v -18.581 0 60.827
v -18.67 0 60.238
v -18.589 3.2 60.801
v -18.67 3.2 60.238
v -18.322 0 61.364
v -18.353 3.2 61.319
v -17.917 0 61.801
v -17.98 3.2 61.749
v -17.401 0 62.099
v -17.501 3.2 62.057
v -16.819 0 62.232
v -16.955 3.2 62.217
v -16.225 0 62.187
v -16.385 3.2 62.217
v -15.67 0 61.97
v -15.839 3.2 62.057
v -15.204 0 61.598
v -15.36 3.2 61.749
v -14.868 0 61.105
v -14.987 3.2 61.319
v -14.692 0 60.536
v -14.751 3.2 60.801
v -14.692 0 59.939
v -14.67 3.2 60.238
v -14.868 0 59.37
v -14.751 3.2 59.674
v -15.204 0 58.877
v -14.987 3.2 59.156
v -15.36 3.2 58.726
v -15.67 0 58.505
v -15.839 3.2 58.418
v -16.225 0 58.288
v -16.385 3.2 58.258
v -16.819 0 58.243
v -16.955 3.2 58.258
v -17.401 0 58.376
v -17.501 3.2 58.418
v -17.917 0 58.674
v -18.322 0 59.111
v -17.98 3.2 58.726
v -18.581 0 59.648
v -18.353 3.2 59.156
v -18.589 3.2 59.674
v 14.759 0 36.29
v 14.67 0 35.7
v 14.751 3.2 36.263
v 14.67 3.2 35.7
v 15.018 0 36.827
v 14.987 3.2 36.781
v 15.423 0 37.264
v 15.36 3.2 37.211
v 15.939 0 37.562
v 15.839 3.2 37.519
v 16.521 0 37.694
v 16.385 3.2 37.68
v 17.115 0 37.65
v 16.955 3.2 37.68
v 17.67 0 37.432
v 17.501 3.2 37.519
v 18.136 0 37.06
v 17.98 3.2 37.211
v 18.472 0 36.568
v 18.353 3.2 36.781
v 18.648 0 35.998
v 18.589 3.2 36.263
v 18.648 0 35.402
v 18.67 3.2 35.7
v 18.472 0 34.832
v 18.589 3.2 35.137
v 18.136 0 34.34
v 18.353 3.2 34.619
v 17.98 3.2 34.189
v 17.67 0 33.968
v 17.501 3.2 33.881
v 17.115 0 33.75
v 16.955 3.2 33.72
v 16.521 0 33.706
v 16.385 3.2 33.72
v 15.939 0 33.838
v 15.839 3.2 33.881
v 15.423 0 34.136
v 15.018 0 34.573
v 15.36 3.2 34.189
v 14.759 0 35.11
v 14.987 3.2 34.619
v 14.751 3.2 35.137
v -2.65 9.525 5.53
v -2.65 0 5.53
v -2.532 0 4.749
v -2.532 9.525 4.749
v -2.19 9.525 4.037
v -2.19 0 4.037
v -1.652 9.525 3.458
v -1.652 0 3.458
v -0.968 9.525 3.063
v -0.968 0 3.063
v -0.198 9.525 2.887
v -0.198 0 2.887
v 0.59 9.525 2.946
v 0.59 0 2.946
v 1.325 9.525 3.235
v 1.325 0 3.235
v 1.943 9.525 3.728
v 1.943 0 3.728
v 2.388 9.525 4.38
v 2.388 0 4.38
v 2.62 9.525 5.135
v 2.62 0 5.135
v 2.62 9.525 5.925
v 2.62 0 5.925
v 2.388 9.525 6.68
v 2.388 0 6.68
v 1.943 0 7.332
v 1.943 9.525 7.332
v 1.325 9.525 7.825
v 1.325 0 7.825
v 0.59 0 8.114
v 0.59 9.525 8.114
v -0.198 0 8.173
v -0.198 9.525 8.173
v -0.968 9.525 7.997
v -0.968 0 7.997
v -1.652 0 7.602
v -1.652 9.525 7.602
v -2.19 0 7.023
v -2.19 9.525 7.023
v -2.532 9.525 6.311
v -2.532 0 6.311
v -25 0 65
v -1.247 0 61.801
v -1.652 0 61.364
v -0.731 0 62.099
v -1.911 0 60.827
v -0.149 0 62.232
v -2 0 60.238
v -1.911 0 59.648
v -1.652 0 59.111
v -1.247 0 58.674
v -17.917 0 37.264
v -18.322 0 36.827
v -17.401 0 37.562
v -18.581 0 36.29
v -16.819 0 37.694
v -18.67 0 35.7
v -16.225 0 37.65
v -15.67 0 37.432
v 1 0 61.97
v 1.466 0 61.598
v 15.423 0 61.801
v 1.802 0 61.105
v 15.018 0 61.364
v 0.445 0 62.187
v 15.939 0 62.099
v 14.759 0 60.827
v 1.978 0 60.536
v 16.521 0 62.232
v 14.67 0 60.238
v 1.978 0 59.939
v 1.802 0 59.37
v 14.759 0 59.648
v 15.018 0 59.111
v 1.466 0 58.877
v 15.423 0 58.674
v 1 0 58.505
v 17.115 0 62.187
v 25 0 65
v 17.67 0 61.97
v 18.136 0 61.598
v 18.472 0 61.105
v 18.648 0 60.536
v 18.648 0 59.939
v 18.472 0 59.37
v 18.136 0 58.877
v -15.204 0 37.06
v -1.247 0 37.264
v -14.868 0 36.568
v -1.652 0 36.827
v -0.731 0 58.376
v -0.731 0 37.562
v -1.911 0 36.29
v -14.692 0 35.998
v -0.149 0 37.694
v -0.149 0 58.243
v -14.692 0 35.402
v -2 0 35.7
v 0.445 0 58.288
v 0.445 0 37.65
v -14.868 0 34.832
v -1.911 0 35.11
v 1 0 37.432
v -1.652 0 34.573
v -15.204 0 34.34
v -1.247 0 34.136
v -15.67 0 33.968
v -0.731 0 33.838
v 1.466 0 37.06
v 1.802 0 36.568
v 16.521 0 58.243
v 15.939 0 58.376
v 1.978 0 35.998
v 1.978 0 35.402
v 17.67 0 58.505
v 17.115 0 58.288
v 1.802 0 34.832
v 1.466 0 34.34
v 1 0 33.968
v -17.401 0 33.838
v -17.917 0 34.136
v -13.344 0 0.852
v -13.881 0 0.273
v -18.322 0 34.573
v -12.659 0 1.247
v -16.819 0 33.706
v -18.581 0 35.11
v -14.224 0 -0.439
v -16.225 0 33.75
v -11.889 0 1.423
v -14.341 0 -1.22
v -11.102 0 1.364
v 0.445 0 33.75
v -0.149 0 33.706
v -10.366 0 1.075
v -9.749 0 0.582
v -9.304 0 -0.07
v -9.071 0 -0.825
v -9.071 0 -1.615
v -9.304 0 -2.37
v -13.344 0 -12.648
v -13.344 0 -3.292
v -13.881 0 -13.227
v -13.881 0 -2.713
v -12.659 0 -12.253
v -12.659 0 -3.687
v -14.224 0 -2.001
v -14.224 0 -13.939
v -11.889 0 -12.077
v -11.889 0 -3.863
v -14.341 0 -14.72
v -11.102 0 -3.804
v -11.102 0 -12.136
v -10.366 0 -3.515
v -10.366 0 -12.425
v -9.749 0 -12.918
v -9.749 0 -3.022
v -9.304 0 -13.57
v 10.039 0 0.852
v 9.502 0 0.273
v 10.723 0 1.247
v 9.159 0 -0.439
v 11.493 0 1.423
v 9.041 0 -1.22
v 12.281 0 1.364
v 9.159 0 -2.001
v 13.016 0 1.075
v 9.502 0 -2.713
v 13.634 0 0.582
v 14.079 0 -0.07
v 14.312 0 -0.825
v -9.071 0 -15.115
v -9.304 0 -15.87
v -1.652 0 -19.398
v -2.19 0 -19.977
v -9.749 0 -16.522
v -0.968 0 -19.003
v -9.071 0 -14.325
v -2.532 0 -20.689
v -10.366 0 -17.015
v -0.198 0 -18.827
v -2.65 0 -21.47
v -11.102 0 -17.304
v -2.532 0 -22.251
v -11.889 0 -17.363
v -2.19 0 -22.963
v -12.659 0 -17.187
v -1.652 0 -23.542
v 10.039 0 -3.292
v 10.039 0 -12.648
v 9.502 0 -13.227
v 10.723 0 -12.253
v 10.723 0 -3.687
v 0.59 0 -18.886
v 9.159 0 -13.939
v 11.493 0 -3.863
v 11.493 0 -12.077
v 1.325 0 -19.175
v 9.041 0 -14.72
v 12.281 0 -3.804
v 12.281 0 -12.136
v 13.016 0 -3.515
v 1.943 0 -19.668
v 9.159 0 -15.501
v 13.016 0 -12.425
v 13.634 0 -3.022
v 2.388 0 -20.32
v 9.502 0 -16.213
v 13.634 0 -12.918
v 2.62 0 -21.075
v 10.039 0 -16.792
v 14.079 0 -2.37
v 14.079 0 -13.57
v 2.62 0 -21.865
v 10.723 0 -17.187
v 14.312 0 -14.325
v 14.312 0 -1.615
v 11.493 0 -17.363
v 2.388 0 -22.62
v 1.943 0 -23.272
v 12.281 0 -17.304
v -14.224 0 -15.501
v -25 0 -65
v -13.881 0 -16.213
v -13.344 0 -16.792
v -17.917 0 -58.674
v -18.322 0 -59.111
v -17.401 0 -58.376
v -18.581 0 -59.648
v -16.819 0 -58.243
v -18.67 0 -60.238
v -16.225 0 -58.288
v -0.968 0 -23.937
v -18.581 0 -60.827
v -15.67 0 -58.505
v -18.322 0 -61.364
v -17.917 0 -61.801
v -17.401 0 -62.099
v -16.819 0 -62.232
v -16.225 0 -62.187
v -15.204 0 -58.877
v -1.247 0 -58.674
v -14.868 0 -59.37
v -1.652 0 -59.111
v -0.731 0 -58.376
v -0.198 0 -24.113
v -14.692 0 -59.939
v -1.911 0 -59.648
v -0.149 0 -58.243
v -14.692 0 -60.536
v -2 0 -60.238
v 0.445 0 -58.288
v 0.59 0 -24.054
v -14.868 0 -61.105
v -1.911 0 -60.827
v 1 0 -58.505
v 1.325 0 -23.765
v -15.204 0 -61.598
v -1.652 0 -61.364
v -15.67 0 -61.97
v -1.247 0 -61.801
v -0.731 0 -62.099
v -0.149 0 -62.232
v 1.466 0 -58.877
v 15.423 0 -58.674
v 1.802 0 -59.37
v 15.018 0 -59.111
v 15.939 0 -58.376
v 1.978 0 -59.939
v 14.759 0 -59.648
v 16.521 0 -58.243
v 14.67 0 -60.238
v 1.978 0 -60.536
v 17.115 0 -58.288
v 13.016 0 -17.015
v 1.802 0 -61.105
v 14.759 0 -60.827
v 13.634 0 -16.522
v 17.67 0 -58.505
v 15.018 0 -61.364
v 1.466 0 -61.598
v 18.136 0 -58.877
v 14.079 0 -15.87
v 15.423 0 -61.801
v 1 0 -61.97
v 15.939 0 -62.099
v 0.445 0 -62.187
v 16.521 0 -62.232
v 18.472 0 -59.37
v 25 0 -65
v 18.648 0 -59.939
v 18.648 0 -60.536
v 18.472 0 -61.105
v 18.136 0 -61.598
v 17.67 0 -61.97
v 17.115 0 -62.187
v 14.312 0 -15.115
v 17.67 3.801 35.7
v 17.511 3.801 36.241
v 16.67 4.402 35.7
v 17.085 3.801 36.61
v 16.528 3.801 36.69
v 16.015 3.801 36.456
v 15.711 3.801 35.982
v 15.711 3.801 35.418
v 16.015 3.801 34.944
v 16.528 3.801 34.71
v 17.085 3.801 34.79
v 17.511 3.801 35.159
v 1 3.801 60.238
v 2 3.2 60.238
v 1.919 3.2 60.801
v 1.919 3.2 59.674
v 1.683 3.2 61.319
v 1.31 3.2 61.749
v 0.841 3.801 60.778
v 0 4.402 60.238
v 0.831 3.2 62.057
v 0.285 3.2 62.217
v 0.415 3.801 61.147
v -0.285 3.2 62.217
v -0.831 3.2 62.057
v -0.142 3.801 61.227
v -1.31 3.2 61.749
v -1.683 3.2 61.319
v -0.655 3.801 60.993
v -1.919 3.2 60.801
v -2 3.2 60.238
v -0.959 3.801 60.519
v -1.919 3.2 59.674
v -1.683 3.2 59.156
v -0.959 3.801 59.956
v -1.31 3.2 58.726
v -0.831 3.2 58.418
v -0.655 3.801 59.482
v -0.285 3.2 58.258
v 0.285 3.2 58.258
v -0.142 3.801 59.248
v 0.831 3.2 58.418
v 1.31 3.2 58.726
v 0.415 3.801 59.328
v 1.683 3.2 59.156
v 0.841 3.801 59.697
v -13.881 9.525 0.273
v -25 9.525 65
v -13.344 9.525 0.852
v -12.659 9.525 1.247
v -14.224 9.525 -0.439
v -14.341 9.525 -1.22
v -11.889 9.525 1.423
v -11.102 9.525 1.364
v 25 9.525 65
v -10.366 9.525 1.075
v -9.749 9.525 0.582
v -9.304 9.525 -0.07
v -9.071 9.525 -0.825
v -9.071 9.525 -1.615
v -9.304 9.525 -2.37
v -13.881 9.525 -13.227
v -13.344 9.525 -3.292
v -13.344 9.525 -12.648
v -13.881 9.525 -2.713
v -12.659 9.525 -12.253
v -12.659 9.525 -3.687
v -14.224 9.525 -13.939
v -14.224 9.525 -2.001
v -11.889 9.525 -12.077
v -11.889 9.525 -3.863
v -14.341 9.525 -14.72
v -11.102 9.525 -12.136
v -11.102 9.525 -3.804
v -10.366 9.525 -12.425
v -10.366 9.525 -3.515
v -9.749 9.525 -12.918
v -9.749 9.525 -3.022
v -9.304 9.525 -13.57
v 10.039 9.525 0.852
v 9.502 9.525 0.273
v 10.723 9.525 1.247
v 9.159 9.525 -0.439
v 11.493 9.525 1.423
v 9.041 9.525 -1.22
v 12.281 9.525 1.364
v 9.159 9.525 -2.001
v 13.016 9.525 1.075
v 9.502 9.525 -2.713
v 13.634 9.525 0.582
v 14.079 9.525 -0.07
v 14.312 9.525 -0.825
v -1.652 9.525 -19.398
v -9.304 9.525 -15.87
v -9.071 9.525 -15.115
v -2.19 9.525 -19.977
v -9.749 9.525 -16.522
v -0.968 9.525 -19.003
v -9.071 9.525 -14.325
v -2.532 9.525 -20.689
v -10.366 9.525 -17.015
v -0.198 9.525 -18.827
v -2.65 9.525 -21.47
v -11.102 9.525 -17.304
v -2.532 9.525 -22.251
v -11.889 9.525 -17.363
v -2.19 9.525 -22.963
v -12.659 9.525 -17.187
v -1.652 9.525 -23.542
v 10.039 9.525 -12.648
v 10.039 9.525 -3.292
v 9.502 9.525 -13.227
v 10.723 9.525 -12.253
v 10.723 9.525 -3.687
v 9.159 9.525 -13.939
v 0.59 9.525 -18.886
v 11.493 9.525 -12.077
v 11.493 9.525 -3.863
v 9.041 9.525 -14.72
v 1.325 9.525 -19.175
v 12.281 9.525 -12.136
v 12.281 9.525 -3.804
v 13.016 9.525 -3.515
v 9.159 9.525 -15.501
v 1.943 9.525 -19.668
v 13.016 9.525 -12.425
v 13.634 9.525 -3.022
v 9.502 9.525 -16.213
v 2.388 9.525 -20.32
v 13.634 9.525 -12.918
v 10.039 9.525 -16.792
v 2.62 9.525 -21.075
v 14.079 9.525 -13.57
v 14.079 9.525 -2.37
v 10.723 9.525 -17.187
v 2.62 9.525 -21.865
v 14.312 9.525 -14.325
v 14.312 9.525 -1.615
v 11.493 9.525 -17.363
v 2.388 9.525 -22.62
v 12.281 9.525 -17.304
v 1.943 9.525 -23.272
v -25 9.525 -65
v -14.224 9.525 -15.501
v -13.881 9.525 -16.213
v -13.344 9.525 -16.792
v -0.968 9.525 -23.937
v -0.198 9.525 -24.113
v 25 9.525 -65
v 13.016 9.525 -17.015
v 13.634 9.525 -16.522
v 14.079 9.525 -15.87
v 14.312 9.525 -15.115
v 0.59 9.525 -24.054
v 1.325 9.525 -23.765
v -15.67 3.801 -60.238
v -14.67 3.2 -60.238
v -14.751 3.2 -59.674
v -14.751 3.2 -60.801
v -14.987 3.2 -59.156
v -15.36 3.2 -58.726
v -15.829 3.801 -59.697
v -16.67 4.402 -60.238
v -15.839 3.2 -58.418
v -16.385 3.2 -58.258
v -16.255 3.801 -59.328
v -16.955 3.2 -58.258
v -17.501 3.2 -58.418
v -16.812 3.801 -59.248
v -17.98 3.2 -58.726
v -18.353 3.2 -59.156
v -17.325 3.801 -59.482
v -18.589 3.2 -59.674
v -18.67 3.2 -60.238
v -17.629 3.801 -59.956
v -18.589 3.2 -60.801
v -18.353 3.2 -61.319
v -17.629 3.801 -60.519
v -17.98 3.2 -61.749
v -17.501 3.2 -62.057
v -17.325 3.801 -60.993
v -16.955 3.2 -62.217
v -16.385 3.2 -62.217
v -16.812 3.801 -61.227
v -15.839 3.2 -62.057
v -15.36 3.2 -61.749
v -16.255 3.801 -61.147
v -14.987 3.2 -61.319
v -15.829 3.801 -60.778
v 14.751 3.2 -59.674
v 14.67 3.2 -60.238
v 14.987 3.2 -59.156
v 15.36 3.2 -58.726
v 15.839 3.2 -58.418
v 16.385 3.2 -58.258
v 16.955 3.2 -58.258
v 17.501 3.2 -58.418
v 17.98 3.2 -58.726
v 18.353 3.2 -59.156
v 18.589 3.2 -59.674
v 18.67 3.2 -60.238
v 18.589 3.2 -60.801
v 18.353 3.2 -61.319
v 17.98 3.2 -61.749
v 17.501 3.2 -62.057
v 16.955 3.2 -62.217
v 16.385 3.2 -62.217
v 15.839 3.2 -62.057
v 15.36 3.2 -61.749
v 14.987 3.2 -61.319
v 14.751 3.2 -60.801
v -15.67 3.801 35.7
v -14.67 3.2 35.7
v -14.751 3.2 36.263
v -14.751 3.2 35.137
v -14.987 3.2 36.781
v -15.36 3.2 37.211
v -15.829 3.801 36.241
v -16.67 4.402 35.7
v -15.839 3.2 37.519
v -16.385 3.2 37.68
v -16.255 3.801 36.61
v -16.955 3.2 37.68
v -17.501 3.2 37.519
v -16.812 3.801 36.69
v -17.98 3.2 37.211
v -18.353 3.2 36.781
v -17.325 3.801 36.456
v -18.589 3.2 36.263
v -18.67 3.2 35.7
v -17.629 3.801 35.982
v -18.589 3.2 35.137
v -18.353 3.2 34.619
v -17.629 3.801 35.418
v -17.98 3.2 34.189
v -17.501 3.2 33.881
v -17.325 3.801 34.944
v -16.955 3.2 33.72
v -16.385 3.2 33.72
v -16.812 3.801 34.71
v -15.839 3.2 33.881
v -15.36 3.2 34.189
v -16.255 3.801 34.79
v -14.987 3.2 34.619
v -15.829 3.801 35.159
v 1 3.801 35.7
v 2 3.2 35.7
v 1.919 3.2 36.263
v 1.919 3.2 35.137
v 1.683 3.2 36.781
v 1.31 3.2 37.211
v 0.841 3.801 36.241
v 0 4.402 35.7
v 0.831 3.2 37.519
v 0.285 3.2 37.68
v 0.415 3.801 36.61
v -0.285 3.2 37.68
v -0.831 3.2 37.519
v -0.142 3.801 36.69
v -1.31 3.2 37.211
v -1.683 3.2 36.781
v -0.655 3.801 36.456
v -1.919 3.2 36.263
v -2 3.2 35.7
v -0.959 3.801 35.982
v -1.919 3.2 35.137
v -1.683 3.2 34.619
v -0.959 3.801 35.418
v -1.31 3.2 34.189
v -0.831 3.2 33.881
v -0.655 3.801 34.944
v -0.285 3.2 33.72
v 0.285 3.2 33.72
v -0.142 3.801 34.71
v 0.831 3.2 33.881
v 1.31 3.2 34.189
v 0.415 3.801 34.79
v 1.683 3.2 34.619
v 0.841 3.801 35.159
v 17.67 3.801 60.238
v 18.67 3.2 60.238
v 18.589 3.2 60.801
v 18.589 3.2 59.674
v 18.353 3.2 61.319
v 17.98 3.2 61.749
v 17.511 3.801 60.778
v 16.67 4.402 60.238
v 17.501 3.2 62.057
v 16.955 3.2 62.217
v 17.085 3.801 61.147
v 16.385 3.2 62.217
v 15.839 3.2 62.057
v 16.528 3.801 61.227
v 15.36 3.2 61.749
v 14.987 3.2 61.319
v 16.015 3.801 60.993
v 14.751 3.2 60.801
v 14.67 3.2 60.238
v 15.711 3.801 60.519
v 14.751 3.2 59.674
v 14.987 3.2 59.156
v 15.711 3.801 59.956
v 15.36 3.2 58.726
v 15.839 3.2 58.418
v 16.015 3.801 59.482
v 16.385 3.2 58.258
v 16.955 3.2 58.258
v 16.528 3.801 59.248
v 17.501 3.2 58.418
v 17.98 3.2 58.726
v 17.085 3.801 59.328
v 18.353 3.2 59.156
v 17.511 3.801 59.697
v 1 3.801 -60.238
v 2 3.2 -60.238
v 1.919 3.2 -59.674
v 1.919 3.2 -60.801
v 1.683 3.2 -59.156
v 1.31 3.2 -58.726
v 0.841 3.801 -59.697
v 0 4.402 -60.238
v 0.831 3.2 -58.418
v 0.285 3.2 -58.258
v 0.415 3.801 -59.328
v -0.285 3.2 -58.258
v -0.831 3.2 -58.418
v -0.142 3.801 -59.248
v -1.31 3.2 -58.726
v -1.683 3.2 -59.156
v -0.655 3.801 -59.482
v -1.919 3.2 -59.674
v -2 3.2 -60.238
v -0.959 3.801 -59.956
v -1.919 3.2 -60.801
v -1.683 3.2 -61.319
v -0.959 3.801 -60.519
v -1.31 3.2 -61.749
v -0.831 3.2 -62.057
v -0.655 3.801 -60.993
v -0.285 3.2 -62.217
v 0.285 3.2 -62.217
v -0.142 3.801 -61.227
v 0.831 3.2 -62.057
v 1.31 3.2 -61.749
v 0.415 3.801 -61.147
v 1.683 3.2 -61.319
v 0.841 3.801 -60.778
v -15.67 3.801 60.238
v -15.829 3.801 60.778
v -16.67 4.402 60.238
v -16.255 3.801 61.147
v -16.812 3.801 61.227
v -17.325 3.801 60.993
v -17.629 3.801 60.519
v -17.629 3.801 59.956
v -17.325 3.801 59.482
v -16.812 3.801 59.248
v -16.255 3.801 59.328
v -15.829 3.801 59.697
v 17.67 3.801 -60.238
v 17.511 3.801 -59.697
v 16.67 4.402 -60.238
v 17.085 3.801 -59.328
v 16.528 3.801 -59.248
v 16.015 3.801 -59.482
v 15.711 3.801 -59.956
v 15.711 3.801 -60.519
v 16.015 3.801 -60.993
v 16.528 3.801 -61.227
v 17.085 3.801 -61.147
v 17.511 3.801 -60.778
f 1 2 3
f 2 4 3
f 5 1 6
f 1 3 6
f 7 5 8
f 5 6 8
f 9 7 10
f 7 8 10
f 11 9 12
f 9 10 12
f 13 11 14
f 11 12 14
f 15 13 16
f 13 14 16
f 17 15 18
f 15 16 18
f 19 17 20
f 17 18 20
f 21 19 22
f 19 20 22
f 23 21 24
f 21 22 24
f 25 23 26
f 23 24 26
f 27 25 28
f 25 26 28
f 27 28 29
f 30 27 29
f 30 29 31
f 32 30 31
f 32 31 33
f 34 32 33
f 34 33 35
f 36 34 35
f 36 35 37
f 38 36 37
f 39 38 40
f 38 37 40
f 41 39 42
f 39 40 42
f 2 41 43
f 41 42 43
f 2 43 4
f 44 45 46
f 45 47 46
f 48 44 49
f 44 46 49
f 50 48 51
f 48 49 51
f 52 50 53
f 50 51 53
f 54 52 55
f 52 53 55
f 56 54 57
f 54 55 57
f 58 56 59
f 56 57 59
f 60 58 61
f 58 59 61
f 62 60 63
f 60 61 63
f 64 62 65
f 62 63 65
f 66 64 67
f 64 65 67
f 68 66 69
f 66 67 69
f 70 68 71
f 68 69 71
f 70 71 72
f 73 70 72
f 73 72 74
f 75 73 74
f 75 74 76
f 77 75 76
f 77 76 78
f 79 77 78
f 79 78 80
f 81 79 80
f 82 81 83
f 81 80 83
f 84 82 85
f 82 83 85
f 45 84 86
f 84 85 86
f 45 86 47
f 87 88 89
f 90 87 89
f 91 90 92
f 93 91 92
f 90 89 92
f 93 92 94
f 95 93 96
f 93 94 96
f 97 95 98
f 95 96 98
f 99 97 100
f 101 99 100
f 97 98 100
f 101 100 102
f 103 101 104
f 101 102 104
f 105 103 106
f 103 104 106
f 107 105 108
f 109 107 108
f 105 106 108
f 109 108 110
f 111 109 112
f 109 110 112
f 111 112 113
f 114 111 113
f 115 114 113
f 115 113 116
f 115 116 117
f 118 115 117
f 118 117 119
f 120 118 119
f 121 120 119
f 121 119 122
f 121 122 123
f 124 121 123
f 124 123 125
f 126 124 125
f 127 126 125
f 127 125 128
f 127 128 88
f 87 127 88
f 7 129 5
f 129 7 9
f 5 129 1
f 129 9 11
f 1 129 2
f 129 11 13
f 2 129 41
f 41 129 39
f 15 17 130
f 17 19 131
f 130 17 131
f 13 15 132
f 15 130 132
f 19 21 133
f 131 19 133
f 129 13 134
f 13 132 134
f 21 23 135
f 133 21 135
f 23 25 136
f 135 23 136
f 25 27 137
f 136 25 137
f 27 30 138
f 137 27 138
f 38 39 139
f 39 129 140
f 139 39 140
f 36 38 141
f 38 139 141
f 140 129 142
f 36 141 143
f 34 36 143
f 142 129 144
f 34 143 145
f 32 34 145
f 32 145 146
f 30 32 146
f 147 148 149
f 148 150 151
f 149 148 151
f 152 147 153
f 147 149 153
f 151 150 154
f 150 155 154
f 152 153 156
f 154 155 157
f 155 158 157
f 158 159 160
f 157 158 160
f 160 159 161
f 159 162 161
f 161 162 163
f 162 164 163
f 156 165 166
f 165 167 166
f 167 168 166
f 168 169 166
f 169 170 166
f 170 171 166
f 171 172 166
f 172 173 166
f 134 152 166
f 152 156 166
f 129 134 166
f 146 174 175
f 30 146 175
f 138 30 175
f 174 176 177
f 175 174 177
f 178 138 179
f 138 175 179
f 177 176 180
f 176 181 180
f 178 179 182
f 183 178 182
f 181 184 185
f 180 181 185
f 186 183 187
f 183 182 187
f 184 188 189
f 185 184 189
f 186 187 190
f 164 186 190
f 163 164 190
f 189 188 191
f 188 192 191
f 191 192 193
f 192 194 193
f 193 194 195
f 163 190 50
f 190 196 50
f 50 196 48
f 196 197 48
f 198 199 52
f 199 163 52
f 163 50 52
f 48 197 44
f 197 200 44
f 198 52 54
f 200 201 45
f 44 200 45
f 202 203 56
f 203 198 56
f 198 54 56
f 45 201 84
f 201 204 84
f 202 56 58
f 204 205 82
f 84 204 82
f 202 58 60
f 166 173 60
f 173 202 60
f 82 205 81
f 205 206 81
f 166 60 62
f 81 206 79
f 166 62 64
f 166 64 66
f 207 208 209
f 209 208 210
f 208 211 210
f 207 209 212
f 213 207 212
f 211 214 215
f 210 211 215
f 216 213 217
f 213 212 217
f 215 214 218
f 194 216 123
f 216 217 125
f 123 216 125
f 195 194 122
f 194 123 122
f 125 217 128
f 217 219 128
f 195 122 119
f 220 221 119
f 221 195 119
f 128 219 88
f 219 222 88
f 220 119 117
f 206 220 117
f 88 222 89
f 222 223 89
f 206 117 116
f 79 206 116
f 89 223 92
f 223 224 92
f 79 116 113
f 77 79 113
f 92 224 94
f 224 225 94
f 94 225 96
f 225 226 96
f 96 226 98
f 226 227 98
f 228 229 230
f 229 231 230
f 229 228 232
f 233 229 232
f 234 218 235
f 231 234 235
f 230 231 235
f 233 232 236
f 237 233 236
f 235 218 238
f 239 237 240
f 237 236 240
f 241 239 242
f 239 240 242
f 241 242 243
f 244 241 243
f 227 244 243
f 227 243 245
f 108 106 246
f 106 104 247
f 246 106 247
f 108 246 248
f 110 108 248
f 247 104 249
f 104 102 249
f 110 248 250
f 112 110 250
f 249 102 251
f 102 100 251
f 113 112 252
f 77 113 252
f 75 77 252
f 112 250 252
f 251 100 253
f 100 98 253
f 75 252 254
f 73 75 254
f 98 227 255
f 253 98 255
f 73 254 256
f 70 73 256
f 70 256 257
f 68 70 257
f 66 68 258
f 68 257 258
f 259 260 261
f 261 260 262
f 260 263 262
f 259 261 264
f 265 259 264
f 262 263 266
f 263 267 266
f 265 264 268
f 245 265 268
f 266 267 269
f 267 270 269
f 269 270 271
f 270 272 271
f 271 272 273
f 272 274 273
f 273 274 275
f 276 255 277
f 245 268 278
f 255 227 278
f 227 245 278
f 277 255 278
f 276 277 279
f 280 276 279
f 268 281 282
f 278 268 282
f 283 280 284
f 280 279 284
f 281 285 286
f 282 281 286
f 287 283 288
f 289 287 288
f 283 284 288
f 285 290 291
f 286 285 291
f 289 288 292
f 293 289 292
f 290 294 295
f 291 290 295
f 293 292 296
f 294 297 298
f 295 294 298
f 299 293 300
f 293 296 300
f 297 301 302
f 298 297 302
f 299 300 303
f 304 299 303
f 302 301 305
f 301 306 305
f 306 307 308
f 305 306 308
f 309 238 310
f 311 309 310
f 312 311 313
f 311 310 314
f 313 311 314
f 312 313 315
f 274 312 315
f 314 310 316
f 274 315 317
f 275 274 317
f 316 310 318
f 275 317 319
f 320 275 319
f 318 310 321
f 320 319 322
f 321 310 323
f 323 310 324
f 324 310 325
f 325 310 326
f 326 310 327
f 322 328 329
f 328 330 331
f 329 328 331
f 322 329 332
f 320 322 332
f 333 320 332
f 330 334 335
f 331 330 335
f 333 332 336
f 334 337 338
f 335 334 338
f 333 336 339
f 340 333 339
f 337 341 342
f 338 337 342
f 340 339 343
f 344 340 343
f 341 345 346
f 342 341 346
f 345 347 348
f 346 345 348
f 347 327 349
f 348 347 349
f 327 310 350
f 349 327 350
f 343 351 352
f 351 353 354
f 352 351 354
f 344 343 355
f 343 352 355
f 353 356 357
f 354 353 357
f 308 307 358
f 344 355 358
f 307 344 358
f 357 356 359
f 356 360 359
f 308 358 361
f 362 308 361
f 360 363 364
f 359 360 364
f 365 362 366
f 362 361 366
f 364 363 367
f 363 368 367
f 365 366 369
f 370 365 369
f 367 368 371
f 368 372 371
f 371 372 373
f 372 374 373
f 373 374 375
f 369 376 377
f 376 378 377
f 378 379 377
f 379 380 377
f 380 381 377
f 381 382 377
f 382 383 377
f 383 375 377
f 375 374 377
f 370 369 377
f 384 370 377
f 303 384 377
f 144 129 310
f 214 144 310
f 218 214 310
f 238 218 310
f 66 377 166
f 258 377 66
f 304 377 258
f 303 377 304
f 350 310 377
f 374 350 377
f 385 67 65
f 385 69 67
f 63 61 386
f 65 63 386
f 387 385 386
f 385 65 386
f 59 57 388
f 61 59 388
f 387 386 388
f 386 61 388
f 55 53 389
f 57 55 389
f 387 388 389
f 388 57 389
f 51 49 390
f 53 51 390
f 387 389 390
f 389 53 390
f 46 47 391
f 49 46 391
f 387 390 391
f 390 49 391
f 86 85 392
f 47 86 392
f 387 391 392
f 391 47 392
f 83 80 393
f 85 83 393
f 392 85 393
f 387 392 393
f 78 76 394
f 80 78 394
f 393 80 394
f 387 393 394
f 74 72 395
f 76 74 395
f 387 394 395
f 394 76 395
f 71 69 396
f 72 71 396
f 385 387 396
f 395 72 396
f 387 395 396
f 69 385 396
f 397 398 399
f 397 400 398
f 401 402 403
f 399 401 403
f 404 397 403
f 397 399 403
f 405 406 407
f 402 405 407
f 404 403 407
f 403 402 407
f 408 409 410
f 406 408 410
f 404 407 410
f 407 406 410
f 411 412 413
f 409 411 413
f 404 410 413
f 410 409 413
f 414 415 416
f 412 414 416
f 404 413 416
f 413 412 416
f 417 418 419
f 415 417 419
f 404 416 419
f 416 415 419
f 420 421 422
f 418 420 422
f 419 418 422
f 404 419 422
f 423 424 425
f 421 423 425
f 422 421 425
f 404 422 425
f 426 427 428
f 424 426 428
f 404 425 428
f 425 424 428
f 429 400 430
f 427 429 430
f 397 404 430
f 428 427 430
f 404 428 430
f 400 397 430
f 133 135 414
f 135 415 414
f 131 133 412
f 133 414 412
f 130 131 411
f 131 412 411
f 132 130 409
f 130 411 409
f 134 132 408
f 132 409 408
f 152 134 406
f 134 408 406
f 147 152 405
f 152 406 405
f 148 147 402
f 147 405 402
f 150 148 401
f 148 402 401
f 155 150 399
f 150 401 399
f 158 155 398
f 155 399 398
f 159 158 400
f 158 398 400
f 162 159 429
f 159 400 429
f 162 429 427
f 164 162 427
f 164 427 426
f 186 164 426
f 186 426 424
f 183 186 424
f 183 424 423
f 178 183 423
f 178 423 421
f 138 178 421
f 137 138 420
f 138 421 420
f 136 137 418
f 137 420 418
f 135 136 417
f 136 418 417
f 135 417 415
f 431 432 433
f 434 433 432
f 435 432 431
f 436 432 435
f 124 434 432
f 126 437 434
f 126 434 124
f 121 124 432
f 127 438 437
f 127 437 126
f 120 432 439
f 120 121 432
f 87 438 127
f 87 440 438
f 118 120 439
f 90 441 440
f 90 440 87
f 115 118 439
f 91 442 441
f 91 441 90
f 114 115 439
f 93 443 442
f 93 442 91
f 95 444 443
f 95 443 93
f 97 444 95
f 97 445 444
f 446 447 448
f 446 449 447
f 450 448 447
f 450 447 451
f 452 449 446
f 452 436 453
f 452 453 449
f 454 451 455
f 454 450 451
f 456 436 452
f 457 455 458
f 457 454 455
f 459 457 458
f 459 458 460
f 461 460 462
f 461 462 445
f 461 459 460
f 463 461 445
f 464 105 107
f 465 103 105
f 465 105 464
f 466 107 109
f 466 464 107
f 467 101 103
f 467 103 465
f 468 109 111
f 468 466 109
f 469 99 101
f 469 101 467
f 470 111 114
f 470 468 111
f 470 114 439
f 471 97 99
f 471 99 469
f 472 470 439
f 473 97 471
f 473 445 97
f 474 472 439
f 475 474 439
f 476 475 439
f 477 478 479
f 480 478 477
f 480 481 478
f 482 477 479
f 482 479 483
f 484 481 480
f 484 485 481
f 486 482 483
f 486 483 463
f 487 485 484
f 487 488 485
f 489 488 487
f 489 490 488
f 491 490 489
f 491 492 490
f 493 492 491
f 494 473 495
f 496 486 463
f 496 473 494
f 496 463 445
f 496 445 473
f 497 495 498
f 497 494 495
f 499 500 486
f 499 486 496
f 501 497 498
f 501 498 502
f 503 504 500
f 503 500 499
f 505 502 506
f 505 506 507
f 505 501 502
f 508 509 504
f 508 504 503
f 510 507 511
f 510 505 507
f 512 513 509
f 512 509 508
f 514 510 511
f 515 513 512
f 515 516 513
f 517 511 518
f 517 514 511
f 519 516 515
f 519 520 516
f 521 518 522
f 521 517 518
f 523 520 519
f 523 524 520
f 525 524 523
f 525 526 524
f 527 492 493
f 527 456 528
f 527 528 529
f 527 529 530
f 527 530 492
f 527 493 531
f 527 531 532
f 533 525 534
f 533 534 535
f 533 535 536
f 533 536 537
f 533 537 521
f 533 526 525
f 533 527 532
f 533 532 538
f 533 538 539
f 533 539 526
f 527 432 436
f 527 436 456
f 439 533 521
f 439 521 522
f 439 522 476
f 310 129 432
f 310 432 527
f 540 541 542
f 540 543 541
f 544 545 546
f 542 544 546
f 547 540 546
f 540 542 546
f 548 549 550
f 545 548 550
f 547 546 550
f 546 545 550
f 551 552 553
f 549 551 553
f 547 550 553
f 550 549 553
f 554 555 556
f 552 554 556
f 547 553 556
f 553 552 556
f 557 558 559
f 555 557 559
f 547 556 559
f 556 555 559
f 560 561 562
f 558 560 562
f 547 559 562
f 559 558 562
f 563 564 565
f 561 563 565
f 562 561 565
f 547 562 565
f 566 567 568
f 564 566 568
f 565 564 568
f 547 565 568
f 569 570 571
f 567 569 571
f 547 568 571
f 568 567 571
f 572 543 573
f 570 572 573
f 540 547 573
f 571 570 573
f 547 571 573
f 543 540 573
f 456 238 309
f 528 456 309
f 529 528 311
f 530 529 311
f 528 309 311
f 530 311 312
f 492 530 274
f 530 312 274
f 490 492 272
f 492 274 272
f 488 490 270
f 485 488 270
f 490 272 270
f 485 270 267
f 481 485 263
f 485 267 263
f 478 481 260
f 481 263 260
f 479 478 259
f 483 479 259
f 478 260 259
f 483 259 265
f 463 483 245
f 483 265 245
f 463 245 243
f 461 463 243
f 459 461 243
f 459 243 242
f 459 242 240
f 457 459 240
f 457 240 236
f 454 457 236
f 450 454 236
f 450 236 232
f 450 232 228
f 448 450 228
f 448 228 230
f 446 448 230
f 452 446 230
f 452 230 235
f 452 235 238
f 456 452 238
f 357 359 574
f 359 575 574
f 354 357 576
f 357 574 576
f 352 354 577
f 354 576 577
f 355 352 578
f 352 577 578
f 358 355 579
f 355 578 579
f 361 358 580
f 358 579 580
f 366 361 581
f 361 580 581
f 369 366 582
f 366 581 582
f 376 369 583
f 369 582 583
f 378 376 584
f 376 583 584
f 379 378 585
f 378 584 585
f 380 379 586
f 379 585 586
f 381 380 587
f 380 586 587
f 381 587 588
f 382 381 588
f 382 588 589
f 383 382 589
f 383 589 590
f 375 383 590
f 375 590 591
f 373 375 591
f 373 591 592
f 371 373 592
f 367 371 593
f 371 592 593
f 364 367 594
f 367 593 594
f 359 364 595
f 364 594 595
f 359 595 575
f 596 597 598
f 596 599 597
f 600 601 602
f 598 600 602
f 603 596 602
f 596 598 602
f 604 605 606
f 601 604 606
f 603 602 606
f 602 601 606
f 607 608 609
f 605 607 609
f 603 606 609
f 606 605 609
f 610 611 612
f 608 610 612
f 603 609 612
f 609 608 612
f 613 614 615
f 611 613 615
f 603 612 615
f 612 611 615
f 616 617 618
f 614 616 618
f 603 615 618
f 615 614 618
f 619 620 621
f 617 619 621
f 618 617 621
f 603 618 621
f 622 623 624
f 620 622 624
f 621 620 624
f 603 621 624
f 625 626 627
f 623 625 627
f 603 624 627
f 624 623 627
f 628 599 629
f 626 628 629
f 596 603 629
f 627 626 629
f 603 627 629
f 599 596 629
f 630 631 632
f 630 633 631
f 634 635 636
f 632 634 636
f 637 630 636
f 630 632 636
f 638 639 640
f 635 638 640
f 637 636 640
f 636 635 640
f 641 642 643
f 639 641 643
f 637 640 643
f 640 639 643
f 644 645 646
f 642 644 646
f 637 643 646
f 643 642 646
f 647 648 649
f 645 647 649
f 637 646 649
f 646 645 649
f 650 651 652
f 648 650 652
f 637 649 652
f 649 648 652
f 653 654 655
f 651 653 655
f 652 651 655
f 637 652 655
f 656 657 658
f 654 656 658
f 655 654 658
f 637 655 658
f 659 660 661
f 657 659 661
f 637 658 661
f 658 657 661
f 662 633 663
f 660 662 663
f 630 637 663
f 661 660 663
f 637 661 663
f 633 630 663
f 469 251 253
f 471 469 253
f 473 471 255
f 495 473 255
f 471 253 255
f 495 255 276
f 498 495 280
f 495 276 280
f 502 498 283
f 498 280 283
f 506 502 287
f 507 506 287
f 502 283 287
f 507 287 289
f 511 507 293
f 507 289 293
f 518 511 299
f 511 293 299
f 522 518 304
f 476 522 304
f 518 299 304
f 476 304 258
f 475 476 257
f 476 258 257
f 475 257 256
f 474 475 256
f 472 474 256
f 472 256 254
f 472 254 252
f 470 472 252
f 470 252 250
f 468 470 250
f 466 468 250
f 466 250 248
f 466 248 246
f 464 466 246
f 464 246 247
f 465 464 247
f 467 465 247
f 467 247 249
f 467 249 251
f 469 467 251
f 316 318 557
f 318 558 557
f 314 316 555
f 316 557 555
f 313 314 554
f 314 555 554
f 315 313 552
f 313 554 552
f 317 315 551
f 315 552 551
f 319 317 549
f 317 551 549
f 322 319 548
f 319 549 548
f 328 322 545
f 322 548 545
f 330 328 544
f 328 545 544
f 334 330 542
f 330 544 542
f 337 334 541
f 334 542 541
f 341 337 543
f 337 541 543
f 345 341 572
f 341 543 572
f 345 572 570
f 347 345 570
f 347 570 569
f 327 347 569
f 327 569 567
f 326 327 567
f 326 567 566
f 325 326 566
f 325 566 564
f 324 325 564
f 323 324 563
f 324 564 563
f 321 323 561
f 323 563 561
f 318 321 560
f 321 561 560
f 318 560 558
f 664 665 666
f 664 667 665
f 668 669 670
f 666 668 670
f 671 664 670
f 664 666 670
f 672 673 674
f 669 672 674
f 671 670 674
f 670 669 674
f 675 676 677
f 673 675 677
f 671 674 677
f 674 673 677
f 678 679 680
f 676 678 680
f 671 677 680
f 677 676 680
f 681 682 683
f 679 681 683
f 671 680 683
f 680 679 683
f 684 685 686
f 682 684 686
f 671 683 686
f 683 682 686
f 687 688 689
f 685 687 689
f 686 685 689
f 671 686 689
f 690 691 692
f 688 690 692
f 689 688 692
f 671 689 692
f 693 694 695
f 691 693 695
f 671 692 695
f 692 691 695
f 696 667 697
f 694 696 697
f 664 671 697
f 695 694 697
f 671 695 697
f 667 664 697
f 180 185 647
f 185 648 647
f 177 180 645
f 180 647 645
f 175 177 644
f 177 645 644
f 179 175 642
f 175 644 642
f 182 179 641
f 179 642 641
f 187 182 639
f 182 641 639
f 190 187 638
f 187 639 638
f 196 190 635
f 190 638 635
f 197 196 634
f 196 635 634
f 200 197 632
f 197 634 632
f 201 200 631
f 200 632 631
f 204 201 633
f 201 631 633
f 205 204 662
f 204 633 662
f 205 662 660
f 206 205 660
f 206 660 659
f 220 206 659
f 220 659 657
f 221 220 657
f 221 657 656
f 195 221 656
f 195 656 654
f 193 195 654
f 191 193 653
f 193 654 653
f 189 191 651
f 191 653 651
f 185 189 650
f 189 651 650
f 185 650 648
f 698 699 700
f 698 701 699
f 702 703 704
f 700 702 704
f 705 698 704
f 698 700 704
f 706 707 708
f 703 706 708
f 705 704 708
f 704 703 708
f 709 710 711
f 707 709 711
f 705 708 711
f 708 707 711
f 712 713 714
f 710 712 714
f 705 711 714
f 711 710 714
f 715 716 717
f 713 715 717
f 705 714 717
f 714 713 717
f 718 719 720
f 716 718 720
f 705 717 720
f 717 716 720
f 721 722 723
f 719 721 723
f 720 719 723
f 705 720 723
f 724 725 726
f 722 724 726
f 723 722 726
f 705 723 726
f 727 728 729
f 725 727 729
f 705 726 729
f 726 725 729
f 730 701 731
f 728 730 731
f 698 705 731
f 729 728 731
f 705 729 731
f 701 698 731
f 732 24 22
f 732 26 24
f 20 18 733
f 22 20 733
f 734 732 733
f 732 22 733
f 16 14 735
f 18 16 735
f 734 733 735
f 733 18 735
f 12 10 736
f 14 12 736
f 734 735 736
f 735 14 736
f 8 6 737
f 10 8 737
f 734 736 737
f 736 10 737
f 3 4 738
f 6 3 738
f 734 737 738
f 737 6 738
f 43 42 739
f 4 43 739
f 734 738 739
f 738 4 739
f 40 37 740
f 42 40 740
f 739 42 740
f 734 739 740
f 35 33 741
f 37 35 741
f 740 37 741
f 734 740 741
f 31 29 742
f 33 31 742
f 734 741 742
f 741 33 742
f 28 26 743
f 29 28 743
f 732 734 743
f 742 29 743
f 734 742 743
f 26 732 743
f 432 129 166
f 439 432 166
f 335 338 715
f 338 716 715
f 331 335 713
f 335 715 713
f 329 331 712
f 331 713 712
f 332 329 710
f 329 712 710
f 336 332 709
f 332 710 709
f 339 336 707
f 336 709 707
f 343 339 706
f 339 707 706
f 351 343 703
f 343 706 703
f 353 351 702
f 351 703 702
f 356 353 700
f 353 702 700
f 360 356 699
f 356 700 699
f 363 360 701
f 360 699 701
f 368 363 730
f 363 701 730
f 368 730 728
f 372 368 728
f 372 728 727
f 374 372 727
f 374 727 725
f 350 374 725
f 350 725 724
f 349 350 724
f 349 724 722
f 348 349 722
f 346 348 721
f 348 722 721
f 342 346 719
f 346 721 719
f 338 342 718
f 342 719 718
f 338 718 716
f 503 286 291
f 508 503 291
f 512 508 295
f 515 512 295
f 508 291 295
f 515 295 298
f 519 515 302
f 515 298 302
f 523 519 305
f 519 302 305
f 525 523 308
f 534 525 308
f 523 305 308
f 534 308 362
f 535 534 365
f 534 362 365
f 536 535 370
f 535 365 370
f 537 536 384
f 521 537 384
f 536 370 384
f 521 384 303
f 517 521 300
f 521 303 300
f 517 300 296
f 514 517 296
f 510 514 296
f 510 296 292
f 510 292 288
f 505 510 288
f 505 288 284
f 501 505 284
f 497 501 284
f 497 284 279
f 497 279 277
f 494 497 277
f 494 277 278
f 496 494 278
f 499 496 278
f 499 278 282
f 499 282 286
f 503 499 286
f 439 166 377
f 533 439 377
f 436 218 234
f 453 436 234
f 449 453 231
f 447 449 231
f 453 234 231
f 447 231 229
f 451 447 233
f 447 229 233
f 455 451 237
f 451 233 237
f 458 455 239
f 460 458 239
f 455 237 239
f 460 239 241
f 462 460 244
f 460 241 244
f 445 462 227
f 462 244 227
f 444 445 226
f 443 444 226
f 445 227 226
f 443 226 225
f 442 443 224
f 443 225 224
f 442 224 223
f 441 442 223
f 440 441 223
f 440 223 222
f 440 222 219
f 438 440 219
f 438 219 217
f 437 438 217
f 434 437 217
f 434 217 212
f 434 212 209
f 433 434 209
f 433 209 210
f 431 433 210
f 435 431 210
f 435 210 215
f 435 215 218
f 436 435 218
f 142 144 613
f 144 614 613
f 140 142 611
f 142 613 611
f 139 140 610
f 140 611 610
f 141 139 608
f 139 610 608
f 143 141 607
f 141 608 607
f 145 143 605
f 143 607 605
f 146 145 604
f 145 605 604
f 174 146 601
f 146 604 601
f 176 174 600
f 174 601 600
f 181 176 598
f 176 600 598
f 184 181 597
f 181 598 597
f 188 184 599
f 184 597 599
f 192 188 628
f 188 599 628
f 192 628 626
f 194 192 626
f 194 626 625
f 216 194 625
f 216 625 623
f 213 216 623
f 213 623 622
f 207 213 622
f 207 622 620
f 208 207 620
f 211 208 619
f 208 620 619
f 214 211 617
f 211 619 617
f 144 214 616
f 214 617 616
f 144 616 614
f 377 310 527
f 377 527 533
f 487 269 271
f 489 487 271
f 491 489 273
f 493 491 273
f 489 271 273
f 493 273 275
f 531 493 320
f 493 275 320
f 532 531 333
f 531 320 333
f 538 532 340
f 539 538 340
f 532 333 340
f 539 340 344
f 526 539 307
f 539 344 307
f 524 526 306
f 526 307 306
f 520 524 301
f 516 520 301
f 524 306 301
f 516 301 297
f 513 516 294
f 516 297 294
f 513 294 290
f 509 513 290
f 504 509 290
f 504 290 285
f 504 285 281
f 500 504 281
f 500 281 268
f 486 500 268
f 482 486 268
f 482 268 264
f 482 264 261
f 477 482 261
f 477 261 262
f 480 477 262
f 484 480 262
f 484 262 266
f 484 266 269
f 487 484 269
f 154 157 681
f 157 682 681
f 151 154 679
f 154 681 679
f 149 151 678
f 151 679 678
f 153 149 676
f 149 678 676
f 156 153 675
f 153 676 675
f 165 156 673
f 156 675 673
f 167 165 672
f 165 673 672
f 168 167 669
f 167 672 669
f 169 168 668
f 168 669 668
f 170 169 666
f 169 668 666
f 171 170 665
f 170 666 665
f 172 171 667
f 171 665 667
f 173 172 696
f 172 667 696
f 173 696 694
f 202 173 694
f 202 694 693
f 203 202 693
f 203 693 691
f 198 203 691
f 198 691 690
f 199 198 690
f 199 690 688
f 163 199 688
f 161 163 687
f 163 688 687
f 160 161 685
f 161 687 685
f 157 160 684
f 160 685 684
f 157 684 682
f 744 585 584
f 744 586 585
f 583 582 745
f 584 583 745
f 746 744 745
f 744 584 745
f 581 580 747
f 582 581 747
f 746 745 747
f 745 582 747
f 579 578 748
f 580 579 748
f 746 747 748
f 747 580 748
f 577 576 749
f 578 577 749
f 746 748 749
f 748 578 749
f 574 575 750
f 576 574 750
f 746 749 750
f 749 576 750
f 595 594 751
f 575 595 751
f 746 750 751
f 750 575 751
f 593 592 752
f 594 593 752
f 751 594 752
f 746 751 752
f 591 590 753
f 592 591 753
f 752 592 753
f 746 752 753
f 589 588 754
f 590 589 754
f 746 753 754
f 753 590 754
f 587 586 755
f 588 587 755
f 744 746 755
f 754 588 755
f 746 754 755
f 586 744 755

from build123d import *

# Parameters (mm, degrees)
SKETCH1_W                 = 50
SKETCH1_H                 = 130
BOSS_EXTRUDE1_DEPTH       = 9.525
F_4_0MM_DOWEL_HOLE1_D     = 4
F_4_0MM_DOWEL_HOLE1_DEPTH = 3.2
F_4_0MM_DOWEL_HOLE1_TIP   = 1.201721238
M5_CLEARANCE_HOLE1_D      = 5.3


with BuildPart() as part:
    # Sketch1 → Boss-Extrude1 (new body)
    with BuildSketch(Plane(origin=(0, 0, 0), x_dir=(1, 0, 0), z_dir=(0, 1, 0))):
        Rectangle(SKETCH1_W, SKETCH1_H)
    extrude(amount=BOSS_EXTRUDE1_DEPTH)

    # Ø4.0mm Dowel Hole1
    with Locations(Plane.XZ):
        with Locations((-16.67, 60.2375), (-16.67, -60.2375), (0, -60.2375), (16.67, -60.2375), (16.67, 35.7), (0, 35.7), (-16.67, 35.7), (16.67, 60.2375), (0, 60.2375)):
            Hole(F_4_0MM_DOWEL_HOLE1_D / 2, depth=F_4_0MM_DOWEL_HOLE1_DEPTH)
            with Locations((0, 0, -(F_4_0MM_DOWEL_HOLE1_DEPTH + F_4_0MM_DOWEL_HOLE1_TIP / 2))):  # 118° drill point
                Cone(0, F_4_0MM_DOWEL_HOLE1_D / 2, F_4_0MM_DOWEL_HOLE1_TIP, mode=Mode.SUBTRACT)

    # M5 Clearance Hole1 (through all)
    with Locations(Plane(origin=(0, 9.525, 0), x_dir=(1, 0, 0), z_dir=(0, 1, 0))):
        with Locations((-11.691342951, 14.72), (0, 21.47), (11.691342951, 14.72), (11.691342951, 1.22), (0, -5.53), (-11.691342951, 1.22)):
            Hole(M5_CLEARANCE_HOLE1_D / 2)


solid = part.part
